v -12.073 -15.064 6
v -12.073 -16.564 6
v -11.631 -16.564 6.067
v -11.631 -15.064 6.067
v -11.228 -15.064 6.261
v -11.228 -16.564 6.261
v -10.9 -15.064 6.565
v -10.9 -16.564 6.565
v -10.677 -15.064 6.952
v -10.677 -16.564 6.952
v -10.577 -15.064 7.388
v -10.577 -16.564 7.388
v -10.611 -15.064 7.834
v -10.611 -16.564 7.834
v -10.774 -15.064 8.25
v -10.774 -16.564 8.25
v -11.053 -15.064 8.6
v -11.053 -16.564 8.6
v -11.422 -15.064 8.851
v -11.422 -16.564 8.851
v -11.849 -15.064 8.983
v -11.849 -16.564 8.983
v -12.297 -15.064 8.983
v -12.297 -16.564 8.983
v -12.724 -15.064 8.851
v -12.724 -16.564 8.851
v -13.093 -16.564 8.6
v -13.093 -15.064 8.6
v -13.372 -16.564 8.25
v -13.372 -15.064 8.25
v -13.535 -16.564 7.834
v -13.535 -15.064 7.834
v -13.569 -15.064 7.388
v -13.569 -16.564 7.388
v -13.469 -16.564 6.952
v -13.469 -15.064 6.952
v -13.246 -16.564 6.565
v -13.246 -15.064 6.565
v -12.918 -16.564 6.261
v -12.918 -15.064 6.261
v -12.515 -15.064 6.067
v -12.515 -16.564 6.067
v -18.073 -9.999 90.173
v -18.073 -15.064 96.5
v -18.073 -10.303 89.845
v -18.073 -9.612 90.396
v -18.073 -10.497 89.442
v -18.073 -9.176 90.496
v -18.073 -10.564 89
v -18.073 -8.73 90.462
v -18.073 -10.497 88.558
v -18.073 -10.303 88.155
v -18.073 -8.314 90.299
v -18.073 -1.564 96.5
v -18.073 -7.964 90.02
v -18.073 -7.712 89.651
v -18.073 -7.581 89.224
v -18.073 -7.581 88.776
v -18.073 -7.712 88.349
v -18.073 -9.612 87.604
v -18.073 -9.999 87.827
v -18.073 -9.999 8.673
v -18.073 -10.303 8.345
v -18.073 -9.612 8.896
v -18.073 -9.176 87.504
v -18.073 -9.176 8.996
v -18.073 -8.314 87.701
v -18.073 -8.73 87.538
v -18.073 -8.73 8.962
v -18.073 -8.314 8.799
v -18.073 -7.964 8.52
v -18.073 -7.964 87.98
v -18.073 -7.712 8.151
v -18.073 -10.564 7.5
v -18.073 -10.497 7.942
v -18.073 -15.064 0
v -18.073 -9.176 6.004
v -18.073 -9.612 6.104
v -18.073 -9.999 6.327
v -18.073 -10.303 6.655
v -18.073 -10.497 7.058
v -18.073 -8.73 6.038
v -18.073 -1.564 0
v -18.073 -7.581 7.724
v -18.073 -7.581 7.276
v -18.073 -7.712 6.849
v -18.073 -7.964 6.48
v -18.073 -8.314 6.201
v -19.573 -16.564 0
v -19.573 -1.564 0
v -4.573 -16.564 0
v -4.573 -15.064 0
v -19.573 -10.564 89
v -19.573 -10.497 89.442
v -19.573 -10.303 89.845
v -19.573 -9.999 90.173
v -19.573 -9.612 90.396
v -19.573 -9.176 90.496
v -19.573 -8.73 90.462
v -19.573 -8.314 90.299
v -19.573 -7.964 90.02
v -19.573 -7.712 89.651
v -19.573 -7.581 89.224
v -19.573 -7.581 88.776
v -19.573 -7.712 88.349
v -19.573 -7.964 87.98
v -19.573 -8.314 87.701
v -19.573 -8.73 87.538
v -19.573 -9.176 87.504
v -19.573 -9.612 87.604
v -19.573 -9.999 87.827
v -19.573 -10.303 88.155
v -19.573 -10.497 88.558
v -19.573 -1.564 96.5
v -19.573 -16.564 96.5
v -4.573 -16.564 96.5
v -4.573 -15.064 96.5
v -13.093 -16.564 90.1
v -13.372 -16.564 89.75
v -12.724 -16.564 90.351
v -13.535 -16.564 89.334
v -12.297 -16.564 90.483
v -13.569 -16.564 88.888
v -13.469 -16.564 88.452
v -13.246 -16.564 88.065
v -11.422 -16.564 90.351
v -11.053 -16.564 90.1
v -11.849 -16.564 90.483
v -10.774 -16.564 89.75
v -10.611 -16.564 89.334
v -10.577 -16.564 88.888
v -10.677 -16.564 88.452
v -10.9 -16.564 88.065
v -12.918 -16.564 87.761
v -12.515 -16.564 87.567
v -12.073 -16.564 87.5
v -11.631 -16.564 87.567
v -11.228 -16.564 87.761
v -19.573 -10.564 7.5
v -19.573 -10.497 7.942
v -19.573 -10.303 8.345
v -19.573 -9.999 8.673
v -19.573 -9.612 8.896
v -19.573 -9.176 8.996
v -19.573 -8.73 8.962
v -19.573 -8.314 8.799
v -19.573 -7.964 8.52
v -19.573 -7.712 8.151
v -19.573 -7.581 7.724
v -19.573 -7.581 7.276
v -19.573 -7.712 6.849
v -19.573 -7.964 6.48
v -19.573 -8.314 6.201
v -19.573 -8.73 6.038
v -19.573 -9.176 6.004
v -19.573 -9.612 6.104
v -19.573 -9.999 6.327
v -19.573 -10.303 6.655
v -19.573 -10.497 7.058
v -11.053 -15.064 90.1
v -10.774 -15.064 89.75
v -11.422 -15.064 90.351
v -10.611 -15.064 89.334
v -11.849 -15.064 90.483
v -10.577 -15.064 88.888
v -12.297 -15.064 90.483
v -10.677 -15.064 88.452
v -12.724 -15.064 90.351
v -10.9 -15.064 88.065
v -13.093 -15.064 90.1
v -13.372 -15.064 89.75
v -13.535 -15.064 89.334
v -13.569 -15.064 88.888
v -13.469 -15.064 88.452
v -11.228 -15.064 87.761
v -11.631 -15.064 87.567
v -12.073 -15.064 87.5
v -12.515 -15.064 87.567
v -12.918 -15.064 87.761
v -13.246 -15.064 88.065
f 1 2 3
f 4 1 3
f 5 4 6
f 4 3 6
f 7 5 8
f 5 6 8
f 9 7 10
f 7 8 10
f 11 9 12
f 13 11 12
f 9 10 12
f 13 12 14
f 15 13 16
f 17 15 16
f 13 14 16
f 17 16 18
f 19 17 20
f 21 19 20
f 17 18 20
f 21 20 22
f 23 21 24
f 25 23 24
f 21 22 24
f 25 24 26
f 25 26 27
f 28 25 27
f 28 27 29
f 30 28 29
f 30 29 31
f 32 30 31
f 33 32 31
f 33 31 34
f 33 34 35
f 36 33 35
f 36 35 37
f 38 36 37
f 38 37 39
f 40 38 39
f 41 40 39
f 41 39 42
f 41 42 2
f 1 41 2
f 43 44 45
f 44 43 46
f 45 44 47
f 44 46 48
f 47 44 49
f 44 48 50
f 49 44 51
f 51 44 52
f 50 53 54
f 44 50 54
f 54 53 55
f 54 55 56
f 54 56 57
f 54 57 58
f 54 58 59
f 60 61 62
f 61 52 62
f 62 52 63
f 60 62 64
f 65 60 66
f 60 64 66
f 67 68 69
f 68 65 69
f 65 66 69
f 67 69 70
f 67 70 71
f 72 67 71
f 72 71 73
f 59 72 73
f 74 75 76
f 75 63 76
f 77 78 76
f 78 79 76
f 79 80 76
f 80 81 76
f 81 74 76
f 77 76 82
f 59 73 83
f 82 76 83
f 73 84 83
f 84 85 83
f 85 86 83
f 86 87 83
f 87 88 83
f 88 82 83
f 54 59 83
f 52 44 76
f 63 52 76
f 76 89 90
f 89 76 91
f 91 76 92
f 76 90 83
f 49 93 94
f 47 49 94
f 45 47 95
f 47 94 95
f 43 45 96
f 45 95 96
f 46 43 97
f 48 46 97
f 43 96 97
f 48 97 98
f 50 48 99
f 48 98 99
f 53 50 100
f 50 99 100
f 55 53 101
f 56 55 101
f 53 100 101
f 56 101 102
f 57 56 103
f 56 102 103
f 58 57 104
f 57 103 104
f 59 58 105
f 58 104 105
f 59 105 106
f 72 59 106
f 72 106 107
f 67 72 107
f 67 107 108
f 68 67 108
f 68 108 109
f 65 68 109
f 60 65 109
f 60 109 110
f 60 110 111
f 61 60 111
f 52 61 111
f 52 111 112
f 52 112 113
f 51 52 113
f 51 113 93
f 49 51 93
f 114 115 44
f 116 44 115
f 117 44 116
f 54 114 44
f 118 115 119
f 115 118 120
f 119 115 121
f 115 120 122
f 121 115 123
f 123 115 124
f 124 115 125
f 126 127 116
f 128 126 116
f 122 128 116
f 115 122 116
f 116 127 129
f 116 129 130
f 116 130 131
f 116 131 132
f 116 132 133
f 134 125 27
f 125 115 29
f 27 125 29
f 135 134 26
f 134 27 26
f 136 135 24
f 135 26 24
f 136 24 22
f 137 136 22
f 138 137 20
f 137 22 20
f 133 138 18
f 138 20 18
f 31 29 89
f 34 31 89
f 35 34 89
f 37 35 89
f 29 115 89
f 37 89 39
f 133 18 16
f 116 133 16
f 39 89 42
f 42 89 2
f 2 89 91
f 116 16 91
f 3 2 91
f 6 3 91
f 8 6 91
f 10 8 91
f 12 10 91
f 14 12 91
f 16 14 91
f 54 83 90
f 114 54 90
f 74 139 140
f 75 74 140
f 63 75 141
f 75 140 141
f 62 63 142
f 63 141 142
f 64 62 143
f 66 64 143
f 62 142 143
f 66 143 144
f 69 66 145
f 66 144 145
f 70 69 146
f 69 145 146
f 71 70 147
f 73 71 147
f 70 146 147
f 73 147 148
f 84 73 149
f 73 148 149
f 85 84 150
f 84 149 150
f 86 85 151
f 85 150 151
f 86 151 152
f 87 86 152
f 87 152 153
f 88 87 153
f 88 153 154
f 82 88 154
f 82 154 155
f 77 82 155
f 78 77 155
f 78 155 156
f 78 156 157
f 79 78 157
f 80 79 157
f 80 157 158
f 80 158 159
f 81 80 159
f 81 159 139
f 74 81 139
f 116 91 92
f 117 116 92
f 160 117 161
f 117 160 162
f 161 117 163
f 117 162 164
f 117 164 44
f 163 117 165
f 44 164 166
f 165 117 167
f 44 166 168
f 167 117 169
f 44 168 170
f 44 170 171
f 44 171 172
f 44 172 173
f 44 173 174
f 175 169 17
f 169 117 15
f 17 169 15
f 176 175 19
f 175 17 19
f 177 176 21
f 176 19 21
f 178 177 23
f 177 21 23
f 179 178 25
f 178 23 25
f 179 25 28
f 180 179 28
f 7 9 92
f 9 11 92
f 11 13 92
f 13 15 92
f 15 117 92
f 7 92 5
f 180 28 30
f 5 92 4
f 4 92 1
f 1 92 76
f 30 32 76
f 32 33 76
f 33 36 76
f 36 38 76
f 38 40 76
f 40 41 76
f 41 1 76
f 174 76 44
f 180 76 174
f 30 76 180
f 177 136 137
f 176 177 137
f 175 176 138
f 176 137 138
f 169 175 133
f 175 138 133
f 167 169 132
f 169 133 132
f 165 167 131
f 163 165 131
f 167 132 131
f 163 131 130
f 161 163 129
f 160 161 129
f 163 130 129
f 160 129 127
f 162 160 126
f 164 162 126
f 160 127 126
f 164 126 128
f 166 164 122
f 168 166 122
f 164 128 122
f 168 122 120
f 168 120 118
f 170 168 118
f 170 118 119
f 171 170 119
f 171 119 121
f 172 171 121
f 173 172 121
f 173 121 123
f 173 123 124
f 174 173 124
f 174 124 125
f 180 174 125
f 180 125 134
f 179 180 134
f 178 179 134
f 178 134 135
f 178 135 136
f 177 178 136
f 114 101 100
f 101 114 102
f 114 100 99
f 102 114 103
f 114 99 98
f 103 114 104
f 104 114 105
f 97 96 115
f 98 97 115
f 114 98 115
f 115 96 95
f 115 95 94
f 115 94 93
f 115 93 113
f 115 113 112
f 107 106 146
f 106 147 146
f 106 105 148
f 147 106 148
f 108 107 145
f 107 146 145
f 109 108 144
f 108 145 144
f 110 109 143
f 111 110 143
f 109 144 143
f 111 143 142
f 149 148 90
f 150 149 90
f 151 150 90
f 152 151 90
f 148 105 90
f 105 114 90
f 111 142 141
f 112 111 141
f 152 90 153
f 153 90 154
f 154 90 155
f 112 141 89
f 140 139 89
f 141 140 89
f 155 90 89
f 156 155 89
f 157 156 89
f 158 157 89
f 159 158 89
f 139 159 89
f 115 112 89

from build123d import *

# Parameters (mm, degrees)
EXTRUSION1_DEPTH = 96.5
ESQUISSE2_R      = 1.5
EXTRUSION2_DEPTH = 98
ESQUISSE3_R      = 1.5
EXTRUSION3_DEPTH = 98


with BuildPart() as part:
    # Esquisse1 → Extrusion1 (new body)
    with BuildSketch(Plane.XY):
        Polygon((-19.573013681, -1.563756614), (-19.573013681, -16.563756614), (-4.573013681, -16.563756614), (-4.573013681, -15.063756614), (-18.073013681, -15.063756614), (-18.073013681, -1.563756614), align=None)
    extrude(amount=EXTRUSION1_DEPTH)

    # Esquisse2 → Extrusion2 (cut)
    with BuildSketch(Plane.XZ.offset(16.563756614)):
        with Locations(Location((-12.073013681, 89, 0), (0, 0, 270))):
            Circle(ESQUISSE2_R)
        with Locations(Location((-12.073013681, 7.5, 0), (0, 0, 270))):
            Circle(ESQUISSE2_R)
    extrude(amount=-EXTRUSION2_DEPTH, mode=Mode.SUBTRACT)

    # Esquisse3 → Extrusion3 (cut)
    with BuildSketch(Plane.ZY.offset(19.573013681)):
        with Locations(Location((89, -9.063756614, 0), (0, 0, 270))):
            Circle(ESQUISSE3_R)
        with Locations(Location((7.5, -9.063756614, 0), (0, 0, 270))):
            Circle(ESQUISSE3_R)
    extrude(amount=-EXTRUSION3_DEPTH, mode=Mode.SUBTRACT)


solid = part.part
